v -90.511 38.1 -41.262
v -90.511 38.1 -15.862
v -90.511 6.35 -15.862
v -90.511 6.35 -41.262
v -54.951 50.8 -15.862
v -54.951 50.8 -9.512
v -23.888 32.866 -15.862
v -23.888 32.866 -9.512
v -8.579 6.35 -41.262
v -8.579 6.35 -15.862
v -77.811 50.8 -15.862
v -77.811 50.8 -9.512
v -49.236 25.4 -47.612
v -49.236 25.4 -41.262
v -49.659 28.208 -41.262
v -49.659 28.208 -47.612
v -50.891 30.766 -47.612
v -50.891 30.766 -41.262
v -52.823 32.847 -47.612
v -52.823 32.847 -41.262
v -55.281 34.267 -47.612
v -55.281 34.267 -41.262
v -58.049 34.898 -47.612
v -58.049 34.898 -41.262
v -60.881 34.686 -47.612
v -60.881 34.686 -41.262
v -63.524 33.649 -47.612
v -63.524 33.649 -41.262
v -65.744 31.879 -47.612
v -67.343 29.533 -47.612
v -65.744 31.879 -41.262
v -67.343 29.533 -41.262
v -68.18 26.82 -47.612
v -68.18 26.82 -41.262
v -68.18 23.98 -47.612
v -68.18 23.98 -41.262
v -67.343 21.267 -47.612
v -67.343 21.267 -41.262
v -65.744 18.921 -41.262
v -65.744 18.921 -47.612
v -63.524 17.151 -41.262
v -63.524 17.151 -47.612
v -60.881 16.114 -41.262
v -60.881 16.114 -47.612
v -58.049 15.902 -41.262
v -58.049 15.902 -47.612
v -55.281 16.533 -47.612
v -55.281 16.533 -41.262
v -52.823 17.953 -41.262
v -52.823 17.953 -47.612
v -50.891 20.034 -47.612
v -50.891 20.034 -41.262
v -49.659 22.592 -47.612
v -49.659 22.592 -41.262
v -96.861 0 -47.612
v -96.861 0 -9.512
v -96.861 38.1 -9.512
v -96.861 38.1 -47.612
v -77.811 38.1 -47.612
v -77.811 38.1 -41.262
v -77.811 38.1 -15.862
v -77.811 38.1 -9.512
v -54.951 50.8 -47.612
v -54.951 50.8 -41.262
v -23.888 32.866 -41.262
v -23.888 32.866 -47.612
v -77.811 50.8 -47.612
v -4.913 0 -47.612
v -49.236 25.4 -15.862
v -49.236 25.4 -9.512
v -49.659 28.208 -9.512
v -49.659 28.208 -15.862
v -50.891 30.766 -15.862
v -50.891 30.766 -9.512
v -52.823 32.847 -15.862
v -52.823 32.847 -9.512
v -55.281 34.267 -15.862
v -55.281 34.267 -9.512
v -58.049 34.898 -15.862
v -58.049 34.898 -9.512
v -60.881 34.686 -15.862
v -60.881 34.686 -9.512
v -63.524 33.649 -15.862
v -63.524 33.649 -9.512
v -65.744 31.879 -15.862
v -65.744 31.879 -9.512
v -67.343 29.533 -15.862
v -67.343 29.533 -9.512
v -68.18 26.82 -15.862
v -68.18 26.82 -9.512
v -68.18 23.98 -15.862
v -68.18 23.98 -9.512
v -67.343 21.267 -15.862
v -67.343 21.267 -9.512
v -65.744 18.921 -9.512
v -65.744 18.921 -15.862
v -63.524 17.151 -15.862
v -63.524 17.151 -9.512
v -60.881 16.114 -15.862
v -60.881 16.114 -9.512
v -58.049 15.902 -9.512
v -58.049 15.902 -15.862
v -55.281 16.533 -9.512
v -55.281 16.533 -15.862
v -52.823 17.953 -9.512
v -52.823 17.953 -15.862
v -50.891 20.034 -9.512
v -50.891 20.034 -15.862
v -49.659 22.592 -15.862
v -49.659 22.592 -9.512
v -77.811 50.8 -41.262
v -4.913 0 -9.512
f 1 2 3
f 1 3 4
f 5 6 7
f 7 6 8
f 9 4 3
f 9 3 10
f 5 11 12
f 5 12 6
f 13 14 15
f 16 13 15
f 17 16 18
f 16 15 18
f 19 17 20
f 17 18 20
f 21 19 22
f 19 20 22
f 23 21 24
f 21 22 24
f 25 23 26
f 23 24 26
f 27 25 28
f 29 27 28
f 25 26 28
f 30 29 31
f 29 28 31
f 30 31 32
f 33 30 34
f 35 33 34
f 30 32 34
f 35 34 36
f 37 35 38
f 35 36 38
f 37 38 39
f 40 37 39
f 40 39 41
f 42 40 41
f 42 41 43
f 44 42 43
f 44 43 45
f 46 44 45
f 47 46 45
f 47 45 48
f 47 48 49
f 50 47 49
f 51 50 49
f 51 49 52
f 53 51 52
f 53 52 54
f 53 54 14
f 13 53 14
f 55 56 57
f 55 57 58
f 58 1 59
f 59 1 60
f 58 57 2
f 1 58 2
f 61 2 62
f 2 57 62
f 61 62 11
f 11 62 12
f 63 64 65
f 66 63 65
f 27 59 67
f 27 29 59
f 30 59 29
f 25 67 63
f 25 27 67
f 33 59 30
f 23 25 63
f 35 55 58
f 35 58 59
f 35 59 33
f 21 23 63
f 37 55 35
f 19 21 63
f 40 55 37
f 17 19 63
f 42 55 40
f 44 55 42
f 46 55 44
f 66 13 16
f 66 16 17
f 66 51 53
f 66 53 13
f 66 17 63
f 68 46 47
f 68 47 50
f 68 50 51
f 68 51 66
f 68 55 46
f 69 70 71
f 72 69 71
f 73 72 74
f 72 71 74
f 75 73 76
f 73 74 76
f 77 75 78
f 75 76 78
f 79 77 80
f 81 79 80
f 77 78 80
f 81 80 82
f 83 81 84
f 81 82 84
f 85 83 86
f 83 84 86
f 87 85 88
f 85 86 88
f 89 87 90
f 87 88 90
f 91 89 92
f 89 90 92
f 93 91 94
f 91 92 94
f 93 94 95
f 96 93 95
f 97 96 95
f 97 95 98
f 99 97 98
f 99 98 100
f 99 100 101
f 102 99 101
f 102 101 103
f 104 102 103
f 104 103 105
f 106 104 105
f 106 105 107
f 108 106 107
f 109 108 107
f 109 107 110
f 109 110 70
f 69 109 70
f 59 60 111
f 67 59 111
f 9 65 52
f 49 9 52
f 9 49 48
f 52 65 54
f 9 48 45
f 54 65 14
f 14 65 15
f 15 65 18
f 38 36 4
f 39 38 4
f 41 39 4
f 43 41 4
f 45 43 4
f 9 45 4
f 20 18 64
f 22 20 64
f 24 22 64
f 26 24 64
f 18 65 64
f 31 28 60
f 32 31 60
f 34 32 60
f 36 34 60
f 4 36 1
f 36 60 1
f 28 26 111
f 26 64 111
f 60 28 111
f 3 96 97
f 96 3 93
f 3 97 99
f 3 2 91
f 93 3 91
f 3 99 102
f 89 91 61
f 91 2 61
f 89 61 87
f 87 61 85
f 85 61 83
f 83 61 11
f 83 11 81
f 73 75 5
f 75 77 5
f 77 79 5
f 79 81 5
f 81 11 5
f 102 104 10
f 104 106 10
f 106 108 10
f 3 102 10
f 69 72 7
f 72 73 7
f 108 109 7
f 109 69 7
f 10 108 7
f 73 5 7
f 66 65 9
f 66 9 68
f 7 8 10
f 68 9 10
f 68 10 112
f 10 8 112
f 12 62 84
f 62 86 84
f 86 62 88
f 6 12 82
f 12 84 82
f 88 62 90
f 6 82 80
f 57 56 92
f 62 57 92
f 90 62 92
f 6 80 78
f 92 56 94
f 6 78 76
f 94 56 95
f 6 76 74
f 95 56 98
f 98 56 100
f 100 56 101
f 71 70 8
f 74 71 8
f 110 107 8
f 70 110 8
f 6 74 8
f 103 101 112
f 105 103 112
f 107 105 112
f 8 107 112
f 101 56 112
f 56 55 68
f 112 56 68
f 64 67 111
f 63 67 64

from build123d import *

# Parameters (mm, degrees)
SKETCH1_W           = 91.948
SKETCH1_H           = 38.1
BOSS_EXTRUDE1_DEPTH = 50.8
SKETCH2_R           = 9.525
CUT_EXTRUDE1_DEPTH  = 116.82034416
SKETCH3_W           = 19.05
SKETCH3_H           = 12.7
CUT_EXTRUDE2_DEPTH  = 116.82034416
SKETCH4_W           = 12.7
SKETCH4_H           = 25.4
SKETCH4_W_2         = 72.898
CUT_EXTRUDE5_DEPTH  = 44.45
CUT_EXTRUDE6_DEPTH  = 116.82034416


with BuildPart() as part:
    # Sketch1 → Boss-Extrude1 (new body)
    with BuildSketch(Plane(origin=(0, 0, 0), x_dir=(1, 0, 0), z_dir=(0, 1, 0))):
        with Locations((-50.887251908, 28.561750636)):
            Rectangle(SKETCH1_W, SKETCH1_H)
    extrude(amount=BOSS_EXTRUDE1_DEPTH)

    # Sketch2 → Cut-Extrude1 (cut, through all)
    with BuildSketch(Plane.XY.offset(-9.511750636)):
        with Locations((-58.761251908, 25.4)):
            Circle(SKETCH2_R)
    extrude(amount=-CUT_EXTRUDE1_DEPTH, mode=Mode.SUBTRACT)

    # Sketch3 → Cut-Extrude2 (cut, through all)
    with BuildSketch(Plane.XY.offset(-9.511750636)):
        with Locations((-87.336251908, 44.45)):
            Rectangle(SKETCH3_W, SKETCH3_H)
    extrude(amount=-CUT_EXTRUDE2_DEPTH, mode=Mode.SUBTRACT)

    # Sketch4 → Cut-Extrude5 (cut)
    with BuildSketch(Plane(origin=(0, 50.8, 0), x_dir=(1, 0, 0), z_dir=(0, 1, 0))):
        with Locations((-84.161251908, 28.561750636)):
            Rectangle(SKETCH4_W, SKETCH4_H)
        with Locations((-41.362251908, 28.561750636)):
            Rectangle(SKETCH4_W_2, SKETCH4_H)
    extrude(amount=-CUT_EXTRUDE5_DEPTH, mode=Mode.SUBTRACT)

    # Sketch5 → Cut-Extrude6 (cut, through all)
    with BuildSketch(Plane.XY.offset(-9.511750636)):
        Polygon((-23.888342421, 32.865820845), (-4.913251908, 0), (-4.913251908, 50.8), (-54.951251908, 50.8), align=None)
    extrude(amount=-CUT_EXTRUDE6_DEPTH, mode=Mode.SUBTRACT)


solid = part.part
